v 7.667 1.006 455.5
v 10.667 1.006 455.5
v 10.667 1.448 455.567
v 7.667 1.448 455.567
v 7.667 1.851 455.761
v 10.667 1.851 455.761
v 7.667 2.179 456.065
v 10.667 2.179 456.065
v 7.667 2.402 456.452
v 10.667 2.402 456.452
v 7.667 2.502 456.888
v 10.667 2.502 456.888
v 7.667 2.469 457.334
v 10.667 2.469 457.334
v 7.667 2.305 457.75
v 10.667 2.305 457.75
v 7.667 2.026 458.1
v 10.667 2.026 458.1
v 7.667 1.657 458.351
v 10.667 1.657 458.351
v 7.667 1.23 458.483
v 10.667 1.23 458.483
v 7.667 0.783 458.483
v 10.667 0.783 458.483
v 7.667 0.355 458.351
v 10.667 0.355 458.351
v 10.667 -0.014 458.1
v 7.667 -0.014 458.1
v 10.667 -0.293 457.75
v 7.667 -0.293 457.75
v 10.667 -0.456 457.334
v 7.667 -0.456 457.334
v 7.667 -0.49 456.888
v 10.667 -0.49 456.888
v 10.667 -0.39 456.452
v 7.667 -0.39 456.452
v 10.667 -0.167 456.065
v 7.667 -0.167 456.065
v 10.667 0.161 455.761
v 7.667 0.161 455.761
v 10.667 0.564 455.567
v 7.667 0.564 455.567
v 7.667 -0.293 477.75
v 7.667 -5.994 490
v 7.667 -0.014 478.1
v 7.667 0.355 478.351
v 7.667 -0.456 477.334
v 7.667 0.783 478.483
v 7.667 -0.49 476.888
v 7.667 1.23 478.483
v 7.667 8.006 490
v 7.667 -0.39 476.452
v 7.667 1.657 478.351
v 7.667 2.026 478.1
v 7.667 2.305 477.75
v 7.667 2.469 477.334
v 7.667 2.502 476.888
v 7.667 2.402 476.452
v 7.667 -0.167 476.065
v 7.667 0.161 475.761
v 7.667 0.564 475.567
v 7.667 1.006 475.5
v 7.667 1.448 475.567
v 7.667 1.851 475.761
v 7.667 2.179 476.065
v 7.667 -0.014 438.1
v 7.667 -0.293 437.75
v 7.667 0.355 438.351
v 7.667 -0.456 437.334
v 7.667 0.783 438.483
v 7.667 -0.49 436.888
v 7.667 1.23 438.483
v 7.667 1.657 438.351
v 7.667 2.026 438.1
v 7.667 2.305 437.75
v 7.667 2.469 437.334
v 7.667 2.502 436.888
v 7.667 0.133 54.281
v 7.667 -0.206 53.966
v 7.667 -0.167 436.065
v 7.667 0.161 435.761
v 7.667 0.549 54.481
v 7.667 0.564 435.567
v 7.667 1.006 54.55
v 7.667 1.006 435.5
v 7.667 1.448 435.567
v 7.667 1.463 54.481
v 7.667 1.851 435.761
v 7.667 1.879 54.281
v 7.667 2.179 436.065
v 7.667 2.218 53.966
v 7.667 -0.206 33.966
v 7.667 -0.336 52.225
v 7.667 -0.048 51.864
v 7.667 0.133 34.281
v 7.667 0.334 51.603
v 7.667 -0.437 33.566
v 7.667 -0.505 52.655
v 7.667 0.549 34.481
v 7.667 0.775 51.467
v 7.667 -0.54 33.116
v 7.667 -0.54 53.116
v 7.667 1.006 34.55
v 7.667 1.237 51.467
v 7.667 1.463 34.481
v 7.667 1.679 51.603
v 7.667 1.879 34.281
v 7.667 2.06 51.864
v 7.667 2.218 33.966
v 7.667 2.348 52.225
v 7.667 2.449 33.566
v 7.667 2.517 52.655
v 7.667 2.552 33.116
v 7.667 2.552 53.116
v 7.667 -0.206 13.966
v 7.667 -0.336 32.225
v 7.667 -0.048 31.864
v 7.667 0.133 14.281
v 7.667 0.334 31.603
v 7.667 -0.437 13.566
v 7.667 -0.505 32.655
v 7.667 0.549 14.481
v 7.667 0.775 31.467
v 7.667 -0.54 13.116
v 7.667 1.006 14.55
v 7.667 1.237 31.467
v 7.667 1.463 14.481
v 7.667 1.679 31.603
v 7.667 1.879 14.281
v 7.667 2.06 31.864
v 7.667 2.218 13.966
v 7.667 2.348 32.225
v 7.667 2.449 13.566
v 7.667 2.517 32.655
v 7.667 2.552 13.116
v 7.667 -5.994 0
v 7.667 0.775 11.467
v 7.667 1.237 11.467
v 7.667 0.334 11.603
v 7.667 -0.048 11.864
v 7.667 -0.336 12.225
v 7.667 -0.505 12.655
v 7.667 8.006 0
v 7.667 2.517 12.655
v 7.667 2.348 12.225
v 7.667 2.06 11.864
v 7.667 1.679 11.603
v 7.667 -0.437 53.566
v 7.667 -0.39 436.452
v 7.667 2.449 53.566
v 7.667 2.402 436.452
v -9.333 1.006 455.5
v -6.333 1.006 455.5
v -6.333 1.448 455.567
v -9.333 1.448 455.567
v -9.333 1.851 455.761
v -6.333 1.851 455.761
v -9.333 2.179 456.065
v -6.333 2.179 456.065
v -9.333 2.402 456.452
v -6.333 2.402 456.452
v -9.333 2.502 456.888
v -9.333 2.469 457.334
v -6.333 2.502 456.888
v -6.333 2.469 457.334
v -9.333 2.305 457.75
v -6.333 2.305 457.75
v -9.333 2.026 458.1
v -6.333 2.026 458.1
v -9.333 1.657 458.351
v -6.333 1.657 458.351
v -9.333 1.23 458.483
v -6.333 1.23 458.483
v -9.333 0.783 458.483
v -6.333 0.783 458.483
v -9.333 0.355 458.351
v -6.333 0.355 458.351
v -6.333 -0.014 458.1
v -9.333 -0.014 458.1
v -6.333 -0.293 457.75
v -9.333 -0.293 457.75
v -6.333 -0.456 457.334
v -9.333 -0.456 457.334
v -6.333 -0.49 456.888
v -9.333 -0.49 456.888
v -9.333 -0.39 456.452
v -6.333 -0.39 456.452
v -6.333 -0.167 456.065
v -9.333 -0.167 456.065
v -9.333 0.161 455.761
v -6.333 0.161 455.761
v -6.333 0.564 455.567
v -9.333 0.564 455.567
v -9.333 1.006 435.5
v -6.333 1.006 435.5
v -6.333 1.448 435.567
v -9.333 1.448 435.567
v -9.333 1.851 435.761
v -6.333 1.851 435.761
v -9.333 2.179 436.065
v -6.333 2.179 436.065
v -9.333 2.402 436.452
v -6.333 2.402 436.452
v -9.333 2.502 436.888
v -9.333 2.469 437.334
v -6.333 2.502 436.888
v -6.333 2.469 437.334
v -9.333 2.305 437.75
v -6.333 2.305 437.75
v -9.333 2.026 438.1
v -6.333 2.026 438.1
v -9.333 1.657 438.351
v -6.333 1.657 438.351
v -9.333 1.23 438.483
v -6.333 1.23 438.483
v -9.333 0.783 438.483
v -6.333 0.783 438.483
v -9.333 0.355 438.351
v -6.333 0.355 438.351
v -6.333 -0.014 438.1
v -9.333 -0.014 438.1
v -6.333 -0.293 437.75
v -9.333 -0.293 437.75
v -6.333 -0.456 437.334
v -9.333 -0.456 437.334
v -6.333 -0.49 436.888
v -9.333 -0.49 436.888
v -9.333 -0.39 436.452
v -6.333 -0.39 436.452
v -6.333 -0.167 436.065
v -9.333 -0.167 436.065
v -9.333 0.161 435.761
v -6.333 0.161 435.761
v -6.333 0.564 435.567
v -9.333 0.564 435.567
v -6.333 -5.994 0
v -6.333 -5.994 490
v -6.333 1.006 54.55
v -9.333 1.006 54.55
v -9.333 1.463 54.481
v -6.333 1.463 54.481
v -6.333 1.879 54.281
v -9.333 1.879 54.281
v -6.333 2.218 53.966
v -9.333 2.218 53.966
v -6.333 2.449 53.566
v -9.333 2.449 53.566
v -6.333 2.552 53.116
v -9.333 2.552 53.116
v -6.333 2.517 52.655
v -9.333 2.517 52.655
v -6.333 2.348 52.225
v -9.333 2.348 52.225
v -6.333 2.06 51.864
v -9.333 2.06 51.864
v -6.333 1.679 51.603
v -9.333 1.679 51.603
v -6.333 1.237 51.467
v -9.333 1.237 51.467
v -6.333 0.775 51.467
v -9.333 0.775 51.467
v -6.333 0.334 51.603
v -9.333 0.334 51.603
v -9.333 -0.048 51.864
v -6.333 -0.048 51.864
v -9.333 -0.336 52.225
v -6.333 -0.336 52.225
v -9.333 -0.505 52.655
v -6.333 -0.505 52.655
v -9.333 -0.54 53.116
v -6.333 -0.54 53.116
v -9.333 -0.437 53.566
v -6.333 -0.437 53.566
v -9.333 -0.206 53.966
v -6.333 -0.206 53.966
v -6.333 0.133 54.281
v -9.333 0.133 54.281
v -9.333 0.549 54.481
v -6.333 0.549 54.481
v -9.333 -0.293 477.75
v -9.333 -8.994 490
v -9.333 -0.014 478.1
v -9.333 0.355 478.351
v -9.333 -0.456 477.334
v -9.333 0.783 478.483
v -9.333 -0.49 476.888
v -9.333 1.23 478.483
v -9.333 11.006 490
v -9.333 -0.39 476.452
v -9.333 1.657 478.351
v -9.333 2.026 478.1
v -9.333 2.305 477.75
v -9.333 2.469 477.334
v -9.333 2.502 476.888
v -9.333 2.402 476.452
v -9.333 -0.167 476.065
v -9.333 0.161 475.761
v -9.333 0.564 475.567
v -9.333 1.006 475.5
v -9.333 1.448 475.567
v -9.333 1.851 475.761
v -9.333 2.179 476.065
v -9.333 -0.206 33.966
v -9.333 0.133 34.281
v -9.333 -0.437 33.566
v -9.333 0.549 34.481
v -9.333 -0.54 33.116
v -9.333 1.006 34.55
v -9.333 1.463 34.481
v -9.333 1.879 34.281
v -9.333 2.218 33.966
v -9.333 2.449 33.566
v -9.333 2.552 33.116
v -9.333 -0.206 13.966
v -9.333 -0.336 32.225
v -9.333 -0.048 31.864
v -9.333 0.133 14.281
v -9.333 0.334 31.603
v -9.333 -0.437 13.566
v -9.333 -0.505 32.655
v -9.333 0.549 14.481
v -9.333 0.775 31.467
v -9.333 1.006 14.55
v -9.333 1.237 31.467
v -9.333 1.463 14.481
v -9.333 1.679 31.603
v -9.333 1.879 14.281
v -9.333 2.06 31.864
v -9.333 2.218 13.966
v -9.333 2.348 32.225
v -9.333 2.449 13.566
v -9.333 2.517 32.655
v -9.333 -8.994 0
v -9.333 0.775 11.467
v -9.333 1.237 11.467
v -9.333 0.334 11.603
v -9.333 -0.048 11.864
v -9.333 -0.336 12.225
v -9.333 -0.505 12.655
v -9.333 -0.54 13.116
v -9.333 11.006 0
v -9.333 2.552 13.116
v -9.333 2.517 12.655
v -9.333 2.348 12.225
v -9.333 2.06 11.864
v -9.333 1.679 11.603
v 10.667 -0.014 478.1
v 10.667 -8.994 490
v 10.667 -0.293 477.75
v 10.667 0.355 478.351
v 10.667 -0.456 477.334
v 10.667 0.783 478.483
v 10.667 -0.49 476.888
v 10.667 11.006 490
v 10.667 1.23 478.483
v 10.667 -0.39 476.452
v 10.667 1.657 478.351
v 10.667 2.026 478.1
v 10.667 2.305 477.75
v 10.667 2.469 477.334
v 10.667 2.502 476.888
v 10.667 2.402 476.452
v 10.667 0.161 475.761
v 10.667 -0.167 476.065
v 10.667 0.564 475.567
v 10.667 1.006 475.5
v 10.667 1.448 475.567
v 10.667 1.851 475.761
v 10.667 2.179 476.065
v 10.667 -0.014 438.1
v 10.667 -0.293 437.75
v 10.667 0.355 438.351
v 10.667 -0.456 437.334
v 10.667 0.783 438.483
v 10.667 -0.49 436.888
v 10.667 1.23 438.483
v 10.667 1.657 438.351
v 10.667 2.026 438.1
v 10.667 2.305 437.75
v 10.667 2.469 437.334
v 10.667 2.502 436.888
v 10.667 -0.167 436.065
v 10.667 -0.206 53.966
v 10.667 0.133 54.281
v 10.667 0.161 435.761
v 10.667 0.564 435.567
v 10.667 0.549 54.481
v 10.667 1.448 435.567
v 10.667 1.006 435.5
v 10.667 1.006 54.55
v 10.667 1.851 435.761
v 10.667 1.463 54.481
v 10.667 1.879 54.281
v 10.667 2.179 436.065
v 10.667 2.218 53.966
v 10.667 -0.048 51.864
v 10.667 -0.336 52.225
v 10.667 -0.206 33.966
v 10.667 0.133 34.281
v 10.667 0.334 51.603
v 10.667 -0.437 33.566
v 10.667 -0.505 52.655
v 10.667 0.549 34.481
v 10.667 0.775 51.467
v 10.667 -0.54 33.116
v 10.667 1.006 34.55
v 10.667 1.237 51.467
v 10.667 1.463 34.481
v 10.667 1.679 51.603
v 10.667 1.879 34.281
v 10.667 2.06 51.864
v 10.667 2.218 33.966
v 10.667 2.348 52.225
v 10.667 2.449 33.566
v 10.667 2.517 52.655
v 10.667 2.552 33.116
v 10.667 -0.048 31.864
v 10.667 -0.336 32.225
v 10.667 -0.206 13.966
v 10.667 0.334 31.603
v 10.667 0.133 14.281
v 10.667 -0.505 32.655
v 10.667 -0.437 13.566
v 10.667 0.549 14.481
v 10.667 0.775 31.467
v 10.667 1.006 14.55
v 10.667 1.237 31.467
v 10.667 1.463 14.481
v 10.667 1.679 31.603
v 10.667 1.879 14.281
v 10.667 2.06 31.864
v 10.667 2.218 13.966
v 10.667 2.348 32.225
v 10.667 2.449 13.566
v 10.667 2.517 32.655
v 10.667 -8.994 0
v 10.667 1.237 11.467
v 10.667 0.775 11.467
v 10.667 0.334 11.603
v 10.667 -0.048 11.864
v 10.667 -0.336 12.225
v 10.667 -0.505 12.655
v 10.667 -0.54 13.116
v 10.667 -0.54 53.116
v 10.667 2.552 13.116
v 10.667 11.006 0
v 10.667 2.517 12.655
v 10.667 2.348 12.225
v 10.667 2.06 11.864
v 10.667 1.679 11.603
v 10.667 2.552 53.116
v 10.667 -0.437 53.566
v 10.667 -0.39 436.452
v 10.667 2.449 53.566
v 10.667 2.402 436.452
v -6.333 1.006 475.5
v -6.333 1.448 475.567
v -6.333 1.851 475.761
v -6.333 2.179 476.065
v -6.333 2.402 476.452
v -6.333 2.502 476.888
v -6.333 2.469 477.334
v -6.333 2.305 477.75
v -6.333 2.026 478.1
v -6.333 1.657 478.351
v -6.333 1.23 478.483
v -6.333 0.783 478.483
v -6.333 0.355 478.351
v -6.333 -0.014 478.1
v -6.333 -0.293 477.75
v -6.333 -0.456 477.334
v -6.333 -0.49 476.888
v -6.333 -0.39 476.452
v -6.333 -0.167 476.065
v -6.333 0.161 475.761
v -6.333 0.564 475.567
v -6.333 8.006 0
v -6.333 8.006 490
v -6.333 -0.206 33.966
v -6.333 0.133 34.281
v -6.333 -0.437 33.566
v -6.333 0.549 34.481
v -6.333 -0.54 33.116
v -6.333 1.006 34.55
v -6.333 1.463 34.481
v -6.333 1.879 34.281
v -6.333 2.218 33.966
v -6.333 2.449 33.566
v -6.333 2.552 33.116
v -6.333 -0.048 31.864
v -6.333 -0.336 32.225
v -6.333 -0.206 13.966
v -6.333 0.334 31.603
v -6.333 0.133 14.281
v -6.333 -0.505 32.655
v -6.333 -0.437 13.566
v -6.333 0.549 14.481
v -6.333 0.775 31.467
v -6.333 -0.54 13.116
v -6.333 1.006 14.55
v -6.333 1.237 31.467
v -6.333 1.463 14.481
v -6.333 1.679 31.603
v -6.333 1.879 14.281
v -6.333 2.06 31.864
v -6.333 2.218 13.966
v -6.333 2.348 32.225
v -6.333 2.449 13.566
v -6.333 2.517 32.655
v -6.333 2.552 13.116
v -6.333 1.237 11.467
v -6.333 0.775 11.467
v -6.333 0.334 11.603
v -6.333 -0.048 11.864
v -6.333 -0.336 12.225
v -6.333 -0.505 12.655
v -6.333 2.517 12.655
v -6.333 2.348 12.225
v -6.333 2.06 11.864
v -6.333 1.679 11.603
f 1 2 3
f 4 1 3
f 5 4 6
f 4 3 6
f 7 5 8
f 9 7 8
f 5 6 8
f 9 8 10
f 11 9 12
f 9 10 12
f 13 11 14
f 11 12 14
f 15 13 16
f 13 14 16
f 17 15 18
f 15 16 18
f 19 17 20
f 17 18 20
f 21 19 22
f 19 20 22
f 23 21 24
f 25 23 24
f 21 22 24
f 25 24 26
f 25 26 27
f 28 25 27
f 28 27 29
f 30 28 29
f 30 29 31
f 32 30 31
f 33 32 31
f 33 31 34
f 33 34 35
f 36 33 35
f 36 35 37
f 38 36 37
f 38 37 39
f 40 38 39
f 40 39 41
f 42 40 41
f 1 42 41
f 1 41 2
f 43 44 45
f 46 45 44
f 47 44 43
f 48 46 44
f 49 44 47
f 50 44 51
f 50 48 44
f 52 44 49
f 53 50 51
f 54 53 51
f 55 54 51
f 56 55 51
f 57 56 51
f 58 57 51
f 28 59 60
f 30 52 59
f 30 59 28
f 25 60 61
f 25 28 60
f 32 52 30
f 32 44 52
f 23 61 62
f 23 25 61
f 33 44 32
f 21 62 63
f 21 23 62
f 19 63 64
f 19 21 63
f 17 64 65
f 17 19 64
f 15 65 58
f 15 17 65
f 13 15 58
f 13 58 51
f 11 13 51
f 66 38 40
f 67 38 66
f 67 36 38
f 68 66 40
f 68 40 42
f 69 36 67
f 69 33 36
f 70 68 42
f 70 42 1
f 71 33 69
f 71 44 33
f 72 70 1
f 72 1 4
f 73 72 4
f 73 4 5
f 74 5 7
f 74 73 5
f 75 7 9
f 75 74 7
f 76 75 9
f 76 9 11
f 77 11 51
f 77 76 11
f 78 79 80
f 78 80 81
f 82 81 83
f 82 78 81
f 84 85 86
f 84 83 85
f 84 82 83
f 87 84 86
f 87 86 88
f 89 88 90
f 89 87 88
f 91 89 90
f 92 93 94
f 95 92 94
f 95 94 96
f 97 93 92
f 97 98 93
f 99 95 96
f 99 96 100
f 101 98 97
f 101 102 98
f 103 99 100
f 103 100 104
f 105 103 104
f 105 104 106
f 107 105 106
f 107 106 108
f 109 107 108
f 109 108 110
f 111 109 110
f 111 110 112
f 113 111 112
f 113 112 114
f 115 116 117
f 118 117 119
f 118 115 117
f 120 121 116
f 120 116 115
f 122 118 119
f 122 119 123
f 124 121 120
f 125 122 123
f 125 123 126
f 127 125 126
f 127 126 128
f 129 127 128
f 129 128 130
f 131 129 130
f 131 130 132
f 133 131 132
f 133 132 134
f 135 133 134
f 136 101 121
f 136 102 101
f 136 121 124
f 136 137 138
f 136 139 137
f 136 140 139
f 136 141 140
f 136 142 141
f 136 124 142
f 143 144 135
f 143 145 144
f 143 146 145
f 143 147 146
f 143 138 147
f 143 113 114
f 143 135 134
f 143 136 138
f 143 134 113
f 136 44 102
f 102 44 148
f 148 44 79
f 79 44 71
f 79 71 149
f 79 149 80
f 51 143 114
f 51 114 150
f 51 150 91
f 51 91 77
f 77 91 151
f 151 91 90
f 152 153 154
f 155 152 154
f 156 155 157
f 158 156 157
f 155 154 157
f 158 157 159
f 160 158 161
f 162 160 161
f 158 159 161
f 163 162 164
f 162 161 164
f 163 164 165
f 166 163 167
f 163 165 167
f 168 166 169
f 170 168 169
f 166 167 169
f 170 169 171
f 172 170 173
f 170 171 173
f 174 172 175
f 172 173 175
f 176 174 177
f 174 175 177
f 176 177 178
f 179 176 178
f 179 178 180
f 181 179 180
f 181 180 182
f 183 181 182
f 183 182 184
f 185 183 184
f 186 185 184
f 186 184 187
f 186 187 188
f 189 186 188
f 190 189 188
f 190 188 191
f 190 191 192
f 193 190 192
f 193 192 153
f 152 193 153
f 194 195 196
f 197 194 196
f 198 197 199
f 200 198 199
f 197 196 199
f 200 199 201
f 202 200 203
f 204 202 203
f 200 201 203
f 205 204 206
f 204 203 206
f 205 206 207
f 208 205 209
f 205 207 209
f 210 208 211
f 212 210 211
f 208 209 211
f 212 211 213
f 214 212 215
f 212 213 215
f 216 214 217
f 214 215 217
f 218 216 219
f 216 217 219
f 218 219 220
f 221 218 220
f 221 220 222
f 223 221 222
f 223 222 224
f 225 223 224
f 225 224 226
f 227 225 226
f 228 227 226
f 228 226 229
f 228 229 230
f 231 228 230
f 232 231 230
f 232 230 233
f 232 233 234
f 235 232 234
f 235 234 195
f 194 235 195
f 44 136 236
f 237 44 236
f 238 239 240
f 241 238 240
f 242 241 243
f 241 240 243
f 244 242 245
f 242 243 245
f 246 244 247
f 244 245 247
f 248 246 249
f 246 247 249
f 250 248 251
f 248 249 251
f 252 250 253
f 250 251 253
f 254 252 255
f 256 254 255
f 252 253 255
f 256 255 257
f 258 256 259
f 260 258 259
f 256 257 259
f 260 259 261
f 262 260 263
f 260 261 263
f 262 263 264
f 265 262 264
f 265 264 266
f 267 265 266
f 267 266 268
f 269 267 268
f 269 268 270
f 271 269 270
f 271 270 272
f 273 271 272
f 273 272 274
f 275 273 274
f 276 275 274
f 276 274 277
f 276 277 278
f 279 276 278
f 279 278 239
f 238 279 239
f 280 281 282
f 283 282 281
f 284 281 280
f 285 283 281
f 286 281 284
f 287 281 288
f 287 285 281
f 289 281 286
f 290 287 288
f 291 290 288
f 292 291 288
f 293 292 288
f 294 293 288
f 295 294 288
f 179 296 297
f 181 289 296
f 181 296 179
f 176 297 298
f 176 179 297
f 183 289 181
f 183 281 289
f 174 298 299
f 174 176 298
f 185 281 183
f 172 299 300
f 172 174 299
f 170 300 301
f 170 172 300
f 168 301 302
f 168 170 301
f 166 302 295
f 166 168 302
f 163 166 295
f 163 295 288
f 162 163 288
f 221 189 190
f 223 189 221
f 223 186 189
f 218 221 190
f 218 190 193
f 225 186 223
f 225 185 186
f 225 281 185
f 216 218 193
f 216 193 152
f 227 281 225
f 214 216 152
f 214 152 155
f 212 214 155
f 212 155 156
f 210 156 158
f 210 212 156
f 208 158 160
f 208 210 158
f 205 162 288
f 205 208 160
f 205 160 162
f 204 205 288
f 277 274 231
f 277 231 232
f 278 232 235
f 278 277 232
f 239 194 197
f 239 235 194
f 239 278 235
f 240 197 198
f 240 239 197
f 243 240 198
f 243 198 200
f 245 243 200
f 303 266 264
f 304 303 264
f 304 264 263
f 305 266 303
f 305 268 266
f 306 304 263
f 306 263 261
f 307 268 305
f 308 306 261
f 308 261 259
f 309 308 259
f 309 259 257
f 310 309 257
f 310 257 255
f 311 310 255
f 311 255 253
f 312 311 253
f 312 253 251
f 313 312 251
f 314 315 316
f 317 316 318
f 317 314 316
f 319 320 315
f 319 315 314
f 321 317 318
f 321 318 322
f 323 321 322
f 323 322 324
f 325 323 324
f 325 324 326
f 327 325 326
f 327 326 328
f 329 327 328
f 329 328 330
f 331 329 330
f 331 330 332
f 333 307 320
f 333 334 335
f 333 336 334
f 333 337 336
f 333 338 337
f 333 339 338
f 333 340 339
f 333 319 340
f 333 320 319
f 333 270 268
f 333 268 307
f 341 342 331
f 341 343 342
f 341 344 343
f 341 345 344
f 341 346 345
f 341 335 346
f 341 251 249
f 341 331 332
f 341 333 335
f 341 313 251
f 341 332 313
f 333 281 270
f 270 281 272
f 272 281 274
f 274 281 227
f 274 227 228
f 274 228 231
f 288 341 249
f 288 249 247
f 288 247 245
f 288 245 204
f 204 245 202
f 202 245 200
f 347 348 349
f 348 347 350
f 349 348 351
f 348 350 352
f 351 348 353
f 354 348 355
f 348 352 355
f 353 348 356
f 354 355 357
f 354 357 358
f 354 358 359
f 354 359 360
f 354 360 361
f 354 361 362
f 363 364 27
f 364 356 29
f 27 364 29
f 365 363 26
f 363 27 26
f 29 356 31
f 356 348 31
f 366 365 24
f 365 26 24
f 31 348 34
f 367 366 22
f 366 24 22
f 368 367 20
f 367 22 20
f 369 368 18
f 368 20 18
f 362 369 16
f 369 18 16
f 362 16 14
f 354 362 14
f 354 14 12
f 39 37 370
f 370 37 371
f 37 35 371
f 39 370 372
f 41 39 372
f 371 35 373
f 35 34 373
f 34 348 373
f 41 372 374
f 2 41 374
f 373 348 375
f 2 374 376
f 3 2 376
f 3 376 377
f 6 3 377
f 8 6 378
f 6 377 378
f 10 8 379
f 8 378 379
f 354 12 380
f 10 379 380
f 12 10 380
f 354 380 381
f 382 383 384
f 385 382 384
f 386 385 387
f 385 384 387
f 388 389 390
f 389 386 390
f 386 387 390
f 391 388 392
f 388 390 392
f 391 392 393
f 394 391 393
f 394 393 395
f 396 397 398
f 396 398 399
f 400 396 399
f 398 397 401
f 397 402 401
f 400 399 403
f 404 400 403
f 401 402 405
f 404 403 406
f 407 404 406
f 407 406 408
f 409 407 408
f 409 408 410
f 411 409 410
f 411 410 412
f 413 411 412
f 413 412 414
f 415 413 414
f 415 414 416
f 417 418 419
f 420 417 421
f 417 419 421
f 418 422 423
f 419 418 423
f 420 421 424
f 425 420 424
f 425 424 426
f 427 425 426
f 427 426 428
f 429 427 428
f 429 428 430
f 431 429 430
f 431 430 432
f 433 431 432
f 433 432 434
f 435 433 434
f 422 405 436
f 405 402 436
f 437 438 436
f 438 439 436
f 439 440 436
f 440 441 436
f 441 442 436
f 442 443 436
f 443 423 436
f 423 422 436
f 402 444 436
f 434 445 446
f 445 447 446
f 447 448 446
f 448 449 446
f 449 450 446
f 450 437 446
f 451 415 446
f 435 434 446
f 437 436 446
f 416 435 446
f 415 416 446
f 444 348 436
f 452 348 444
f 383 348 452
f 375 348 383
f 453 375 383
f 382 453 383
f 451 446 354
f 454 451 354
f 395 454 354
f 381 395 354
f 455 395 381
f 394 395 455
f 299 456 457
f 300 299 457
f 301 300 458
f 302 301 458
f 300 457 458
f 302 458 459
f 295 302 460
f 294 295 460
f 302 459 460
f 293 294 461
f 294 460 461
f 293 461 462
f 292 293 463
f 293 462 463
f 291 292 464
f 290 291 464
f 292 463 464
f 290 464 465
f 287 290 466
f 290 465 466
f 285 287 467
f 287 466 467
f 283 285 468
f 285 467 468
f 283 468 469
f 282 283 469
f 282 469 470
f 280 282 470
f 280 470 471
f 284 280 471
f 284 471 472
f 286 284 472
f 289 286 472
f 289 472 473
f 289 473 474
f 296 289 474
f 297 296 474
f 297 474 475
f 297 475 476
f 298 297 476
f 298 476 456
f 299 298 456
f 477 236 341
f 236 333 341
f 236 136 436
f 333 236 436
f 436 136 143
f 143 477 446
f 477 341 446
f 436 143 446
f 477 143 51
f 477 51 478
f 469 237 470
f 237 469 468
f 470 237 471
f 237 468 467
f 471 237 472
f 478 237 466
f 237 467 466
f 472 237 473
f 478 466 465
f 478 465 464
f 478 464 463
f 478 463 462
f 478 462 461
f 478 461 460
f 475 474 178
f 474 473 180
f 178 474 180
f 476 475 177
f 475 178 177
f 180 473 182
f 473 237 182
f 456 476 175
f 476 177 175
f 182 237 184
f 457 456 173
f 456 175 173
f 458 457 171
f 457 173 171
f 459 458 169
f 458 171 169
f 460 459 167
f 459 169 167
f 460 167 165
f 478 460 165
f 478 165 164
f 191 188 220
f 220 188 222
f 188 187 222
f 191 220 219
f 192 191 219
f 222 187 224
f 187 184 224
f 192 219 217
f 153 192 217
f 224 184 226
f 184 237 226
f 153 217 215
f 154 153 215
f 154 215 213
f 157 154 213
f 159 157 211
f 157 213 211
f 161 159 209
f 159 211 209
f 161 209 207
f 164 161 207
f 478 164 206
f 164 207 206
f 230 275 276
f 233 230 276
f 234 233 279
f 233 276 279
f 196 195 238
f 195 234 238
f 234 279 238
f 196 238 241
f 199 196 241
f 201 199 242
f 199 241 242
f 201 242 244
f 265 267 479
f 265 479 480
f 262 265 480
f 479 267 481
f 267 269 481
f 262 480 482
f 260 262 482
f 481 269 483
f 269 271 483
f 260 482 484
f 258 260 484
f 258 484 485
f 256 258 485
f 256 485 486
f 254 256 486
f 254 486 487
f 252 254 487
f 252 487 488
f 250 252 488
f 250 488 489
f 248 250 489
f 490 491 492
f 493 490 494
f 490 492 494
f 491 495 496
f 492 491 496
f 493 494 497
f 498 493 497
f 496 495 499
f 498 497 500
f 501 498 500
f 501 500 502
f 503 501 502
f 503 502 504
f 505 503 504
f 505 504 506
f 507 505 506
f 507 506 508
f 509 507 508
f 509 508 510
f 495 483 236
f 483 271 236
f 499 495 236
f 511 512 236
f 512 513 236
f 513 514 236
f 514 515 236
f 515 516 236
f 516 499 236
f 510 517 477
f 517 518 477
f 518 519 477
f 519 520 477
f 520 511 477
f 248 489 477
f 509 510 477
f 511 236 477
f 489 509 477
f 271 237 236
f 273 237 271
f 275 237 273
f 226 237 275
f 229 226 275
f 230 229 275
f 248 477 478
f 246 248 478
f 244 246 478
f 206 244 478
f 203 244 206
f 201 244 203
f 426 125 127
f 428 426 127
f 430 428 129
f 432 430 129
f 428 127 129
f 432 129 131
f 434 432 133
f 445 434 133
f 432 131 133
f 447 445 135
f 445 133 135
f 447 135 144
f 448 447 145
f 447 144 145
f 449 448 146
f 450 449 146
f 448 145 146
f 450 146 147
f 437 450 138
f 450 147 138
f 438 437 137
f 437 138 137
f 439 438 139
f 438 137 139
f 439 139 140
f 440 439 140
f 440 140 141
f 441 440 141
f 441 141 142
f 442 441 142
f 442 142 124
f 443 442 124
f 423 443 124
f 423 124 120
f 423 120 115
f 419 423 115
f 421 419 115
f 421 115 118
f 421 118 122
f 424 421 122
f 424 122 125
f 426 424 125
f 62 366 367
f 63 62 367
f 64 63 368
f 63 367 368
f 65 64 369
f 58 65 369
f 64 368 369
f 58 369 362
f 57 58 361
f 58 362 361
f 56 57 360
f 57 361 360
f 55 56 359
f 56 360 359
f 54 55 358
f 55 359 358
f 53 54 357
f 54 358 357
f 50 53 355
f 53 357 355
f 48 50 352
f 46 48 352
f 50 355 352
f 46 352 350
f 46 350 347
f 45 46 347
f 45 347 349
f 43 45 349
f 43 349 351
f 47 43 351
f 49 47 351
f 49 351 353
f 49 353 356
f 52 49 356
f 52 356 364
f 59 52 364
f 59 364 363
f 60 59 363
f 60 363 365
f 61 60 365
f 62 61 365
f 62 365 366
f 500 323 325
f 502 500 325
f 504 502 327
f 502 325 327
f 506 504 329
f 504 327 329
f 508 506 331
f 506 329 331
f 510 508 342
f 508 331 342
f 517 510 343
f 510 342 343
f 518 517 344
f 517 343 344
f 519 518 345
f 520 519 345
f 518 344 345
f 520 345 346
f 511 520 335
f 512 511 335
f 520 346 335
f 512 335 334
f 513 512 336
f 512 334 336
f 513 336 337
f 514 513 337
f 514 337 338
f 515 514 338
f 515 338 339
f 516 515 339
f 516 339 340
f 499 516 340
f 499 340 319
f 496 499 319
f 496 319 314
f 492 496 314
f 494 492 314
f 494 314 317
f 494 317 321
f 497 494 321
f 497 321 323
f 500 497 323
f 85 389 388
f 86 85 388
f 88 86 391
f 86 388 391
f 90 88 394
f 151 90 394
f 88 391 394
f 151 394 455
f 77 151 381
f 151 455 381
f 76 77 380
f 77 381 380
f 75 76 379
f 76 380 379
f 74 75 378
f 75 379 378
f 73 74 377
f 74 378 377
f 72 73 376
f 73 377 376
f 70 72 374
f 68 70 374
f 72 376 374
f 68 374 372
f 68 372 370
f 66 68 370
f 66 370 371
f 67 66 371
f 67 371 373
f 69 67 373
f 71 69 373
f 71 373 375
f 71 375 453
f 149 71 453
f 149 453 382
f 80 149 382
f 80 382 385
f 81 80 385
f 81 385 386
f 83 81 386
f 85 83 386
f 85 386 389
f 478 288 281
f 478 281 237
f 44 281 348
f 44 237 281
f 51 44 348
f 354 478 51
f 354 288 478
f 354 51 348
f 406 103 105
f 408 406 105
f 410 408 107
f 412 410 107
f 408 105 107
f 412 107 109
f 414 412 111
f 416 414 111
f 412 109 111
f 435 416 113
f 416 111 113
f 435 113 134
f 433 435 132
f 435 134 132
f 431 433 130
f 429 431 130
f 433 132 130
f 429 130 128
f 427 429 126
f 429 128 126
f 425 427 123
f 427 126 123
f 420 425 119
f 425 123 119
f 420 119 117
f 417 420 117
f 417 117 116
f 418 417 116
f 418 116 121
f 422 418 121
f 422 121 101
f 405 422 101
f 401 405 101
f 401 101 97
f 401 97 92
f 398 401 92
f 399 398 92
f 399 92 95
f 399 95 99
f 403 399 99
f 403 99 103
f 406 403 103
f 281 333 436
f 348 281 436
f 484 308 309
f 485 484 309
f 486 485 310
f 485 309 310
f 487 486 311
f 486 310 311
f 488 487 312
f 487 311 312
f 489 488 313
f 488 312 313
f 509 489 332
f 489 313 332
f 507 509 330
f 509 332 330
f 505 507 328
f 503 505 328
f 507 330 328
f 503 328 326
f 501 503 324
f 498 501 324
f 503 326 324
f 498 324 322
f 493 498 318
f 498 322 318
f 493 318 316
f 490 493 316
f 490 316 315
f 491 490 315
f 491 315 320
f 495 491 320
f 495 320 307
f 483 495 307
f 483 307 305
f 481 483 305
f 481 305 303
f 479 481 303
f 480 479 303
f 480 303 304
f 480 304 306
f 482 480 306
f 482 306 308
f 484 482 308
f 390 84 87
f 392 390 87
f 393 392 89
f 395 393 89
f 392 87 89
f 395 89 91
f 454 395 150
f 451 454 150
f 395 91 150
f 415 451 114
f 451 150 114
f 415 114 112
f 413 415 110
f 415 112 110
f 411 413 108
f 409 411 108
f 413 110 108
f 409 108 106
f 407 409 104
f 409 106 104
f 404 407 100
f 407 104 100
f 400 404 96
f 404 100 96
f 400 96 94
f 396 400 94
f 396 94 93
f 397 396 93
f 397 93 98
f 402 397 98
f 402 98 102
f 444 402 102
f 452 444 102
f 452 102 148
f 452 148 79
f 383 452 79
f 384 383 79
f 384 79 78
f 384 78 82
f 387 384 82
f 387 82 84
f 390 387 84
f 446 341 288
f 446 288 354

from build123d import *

# Parameters (mm, degrees)
SKETCH_1_W          = 20
SKETCH_1_H          = 20
EXTRUDE_1_DEPTH     = 490
SKETCH_2_W          = 14
SKETCH_2_H          = 14
CUT_EXTRUDE_1_DEPTH = 491
SKETCH_3_R          = 1.5
CUT_EXTRUDE_2_DEPTH = 80
SKETCH_4_R          = 1.55
CUT_EXTRUDE_3_DEPTH = 27


with BuildPart() as part:
    # 草图1 → 凸台-拉伸1 (new body)
    with BuildSketch(Plane.XY):
        with Locations((0.666666667, 1.006147649)):
            Rectangle(SKETCH_1_W, SKETCH_1_H)
    extrude(amount=EXTRUDE_1_DEPTH)

    # 草图2 → 切除-拉伸1 (cut, through all)
    with BuildSketch(Plane(origin=(0, 0, 0), x_dir=(-1, 0, 0), z_dir=(0, 0, -1))):
        with Locations((-0.666666667, 1.006147649)):
            Rectangle(SKETCH_2_W, SKETCH_2_H)
    extrude(amount=-CUT_EXTRUDE_1_DEPTH, mode=Mode.SUBTRACT)

    # 草图3 → 切除-拉伸2 (cut)
    with BuildSketch(Plane(origin=(10.666666667, 0, 0), x_dir=(0, 0, -1), z_dir=(1, 0, 0))):
        with Locations((-477, 1.006147649)):
            Circle(SKETCH_3_R)
        with Locations((-457, 1.006147649)):
            Circle(SKETCH_3_R)
        with Locations((-437, 1.006147649)):
            Circle(SKETCH_3_R)
    extrude(amount=-CUT_EXTRUDE_2_DEPTH, mode=Mode.SUBTRACT)

    # 草图4 → 切除-拉伸3 (cut)
    with BuildSketch(Plane.ZY.offset(9.333333333)):
        with Locations((13, 1.006147649)):
            Circle(SKETCH_4_R)
        with Locations((33, 1.006147649)):
            Circle(SKETCH_4_R)
        with Locations((53, 1.006147649)):
            Circle(SKETCH_4_R)
    extrude(amount=-CUT_EXTRUDE_3_DEPTH, mode=Mode.SUBTRACT)


solid = part.part
